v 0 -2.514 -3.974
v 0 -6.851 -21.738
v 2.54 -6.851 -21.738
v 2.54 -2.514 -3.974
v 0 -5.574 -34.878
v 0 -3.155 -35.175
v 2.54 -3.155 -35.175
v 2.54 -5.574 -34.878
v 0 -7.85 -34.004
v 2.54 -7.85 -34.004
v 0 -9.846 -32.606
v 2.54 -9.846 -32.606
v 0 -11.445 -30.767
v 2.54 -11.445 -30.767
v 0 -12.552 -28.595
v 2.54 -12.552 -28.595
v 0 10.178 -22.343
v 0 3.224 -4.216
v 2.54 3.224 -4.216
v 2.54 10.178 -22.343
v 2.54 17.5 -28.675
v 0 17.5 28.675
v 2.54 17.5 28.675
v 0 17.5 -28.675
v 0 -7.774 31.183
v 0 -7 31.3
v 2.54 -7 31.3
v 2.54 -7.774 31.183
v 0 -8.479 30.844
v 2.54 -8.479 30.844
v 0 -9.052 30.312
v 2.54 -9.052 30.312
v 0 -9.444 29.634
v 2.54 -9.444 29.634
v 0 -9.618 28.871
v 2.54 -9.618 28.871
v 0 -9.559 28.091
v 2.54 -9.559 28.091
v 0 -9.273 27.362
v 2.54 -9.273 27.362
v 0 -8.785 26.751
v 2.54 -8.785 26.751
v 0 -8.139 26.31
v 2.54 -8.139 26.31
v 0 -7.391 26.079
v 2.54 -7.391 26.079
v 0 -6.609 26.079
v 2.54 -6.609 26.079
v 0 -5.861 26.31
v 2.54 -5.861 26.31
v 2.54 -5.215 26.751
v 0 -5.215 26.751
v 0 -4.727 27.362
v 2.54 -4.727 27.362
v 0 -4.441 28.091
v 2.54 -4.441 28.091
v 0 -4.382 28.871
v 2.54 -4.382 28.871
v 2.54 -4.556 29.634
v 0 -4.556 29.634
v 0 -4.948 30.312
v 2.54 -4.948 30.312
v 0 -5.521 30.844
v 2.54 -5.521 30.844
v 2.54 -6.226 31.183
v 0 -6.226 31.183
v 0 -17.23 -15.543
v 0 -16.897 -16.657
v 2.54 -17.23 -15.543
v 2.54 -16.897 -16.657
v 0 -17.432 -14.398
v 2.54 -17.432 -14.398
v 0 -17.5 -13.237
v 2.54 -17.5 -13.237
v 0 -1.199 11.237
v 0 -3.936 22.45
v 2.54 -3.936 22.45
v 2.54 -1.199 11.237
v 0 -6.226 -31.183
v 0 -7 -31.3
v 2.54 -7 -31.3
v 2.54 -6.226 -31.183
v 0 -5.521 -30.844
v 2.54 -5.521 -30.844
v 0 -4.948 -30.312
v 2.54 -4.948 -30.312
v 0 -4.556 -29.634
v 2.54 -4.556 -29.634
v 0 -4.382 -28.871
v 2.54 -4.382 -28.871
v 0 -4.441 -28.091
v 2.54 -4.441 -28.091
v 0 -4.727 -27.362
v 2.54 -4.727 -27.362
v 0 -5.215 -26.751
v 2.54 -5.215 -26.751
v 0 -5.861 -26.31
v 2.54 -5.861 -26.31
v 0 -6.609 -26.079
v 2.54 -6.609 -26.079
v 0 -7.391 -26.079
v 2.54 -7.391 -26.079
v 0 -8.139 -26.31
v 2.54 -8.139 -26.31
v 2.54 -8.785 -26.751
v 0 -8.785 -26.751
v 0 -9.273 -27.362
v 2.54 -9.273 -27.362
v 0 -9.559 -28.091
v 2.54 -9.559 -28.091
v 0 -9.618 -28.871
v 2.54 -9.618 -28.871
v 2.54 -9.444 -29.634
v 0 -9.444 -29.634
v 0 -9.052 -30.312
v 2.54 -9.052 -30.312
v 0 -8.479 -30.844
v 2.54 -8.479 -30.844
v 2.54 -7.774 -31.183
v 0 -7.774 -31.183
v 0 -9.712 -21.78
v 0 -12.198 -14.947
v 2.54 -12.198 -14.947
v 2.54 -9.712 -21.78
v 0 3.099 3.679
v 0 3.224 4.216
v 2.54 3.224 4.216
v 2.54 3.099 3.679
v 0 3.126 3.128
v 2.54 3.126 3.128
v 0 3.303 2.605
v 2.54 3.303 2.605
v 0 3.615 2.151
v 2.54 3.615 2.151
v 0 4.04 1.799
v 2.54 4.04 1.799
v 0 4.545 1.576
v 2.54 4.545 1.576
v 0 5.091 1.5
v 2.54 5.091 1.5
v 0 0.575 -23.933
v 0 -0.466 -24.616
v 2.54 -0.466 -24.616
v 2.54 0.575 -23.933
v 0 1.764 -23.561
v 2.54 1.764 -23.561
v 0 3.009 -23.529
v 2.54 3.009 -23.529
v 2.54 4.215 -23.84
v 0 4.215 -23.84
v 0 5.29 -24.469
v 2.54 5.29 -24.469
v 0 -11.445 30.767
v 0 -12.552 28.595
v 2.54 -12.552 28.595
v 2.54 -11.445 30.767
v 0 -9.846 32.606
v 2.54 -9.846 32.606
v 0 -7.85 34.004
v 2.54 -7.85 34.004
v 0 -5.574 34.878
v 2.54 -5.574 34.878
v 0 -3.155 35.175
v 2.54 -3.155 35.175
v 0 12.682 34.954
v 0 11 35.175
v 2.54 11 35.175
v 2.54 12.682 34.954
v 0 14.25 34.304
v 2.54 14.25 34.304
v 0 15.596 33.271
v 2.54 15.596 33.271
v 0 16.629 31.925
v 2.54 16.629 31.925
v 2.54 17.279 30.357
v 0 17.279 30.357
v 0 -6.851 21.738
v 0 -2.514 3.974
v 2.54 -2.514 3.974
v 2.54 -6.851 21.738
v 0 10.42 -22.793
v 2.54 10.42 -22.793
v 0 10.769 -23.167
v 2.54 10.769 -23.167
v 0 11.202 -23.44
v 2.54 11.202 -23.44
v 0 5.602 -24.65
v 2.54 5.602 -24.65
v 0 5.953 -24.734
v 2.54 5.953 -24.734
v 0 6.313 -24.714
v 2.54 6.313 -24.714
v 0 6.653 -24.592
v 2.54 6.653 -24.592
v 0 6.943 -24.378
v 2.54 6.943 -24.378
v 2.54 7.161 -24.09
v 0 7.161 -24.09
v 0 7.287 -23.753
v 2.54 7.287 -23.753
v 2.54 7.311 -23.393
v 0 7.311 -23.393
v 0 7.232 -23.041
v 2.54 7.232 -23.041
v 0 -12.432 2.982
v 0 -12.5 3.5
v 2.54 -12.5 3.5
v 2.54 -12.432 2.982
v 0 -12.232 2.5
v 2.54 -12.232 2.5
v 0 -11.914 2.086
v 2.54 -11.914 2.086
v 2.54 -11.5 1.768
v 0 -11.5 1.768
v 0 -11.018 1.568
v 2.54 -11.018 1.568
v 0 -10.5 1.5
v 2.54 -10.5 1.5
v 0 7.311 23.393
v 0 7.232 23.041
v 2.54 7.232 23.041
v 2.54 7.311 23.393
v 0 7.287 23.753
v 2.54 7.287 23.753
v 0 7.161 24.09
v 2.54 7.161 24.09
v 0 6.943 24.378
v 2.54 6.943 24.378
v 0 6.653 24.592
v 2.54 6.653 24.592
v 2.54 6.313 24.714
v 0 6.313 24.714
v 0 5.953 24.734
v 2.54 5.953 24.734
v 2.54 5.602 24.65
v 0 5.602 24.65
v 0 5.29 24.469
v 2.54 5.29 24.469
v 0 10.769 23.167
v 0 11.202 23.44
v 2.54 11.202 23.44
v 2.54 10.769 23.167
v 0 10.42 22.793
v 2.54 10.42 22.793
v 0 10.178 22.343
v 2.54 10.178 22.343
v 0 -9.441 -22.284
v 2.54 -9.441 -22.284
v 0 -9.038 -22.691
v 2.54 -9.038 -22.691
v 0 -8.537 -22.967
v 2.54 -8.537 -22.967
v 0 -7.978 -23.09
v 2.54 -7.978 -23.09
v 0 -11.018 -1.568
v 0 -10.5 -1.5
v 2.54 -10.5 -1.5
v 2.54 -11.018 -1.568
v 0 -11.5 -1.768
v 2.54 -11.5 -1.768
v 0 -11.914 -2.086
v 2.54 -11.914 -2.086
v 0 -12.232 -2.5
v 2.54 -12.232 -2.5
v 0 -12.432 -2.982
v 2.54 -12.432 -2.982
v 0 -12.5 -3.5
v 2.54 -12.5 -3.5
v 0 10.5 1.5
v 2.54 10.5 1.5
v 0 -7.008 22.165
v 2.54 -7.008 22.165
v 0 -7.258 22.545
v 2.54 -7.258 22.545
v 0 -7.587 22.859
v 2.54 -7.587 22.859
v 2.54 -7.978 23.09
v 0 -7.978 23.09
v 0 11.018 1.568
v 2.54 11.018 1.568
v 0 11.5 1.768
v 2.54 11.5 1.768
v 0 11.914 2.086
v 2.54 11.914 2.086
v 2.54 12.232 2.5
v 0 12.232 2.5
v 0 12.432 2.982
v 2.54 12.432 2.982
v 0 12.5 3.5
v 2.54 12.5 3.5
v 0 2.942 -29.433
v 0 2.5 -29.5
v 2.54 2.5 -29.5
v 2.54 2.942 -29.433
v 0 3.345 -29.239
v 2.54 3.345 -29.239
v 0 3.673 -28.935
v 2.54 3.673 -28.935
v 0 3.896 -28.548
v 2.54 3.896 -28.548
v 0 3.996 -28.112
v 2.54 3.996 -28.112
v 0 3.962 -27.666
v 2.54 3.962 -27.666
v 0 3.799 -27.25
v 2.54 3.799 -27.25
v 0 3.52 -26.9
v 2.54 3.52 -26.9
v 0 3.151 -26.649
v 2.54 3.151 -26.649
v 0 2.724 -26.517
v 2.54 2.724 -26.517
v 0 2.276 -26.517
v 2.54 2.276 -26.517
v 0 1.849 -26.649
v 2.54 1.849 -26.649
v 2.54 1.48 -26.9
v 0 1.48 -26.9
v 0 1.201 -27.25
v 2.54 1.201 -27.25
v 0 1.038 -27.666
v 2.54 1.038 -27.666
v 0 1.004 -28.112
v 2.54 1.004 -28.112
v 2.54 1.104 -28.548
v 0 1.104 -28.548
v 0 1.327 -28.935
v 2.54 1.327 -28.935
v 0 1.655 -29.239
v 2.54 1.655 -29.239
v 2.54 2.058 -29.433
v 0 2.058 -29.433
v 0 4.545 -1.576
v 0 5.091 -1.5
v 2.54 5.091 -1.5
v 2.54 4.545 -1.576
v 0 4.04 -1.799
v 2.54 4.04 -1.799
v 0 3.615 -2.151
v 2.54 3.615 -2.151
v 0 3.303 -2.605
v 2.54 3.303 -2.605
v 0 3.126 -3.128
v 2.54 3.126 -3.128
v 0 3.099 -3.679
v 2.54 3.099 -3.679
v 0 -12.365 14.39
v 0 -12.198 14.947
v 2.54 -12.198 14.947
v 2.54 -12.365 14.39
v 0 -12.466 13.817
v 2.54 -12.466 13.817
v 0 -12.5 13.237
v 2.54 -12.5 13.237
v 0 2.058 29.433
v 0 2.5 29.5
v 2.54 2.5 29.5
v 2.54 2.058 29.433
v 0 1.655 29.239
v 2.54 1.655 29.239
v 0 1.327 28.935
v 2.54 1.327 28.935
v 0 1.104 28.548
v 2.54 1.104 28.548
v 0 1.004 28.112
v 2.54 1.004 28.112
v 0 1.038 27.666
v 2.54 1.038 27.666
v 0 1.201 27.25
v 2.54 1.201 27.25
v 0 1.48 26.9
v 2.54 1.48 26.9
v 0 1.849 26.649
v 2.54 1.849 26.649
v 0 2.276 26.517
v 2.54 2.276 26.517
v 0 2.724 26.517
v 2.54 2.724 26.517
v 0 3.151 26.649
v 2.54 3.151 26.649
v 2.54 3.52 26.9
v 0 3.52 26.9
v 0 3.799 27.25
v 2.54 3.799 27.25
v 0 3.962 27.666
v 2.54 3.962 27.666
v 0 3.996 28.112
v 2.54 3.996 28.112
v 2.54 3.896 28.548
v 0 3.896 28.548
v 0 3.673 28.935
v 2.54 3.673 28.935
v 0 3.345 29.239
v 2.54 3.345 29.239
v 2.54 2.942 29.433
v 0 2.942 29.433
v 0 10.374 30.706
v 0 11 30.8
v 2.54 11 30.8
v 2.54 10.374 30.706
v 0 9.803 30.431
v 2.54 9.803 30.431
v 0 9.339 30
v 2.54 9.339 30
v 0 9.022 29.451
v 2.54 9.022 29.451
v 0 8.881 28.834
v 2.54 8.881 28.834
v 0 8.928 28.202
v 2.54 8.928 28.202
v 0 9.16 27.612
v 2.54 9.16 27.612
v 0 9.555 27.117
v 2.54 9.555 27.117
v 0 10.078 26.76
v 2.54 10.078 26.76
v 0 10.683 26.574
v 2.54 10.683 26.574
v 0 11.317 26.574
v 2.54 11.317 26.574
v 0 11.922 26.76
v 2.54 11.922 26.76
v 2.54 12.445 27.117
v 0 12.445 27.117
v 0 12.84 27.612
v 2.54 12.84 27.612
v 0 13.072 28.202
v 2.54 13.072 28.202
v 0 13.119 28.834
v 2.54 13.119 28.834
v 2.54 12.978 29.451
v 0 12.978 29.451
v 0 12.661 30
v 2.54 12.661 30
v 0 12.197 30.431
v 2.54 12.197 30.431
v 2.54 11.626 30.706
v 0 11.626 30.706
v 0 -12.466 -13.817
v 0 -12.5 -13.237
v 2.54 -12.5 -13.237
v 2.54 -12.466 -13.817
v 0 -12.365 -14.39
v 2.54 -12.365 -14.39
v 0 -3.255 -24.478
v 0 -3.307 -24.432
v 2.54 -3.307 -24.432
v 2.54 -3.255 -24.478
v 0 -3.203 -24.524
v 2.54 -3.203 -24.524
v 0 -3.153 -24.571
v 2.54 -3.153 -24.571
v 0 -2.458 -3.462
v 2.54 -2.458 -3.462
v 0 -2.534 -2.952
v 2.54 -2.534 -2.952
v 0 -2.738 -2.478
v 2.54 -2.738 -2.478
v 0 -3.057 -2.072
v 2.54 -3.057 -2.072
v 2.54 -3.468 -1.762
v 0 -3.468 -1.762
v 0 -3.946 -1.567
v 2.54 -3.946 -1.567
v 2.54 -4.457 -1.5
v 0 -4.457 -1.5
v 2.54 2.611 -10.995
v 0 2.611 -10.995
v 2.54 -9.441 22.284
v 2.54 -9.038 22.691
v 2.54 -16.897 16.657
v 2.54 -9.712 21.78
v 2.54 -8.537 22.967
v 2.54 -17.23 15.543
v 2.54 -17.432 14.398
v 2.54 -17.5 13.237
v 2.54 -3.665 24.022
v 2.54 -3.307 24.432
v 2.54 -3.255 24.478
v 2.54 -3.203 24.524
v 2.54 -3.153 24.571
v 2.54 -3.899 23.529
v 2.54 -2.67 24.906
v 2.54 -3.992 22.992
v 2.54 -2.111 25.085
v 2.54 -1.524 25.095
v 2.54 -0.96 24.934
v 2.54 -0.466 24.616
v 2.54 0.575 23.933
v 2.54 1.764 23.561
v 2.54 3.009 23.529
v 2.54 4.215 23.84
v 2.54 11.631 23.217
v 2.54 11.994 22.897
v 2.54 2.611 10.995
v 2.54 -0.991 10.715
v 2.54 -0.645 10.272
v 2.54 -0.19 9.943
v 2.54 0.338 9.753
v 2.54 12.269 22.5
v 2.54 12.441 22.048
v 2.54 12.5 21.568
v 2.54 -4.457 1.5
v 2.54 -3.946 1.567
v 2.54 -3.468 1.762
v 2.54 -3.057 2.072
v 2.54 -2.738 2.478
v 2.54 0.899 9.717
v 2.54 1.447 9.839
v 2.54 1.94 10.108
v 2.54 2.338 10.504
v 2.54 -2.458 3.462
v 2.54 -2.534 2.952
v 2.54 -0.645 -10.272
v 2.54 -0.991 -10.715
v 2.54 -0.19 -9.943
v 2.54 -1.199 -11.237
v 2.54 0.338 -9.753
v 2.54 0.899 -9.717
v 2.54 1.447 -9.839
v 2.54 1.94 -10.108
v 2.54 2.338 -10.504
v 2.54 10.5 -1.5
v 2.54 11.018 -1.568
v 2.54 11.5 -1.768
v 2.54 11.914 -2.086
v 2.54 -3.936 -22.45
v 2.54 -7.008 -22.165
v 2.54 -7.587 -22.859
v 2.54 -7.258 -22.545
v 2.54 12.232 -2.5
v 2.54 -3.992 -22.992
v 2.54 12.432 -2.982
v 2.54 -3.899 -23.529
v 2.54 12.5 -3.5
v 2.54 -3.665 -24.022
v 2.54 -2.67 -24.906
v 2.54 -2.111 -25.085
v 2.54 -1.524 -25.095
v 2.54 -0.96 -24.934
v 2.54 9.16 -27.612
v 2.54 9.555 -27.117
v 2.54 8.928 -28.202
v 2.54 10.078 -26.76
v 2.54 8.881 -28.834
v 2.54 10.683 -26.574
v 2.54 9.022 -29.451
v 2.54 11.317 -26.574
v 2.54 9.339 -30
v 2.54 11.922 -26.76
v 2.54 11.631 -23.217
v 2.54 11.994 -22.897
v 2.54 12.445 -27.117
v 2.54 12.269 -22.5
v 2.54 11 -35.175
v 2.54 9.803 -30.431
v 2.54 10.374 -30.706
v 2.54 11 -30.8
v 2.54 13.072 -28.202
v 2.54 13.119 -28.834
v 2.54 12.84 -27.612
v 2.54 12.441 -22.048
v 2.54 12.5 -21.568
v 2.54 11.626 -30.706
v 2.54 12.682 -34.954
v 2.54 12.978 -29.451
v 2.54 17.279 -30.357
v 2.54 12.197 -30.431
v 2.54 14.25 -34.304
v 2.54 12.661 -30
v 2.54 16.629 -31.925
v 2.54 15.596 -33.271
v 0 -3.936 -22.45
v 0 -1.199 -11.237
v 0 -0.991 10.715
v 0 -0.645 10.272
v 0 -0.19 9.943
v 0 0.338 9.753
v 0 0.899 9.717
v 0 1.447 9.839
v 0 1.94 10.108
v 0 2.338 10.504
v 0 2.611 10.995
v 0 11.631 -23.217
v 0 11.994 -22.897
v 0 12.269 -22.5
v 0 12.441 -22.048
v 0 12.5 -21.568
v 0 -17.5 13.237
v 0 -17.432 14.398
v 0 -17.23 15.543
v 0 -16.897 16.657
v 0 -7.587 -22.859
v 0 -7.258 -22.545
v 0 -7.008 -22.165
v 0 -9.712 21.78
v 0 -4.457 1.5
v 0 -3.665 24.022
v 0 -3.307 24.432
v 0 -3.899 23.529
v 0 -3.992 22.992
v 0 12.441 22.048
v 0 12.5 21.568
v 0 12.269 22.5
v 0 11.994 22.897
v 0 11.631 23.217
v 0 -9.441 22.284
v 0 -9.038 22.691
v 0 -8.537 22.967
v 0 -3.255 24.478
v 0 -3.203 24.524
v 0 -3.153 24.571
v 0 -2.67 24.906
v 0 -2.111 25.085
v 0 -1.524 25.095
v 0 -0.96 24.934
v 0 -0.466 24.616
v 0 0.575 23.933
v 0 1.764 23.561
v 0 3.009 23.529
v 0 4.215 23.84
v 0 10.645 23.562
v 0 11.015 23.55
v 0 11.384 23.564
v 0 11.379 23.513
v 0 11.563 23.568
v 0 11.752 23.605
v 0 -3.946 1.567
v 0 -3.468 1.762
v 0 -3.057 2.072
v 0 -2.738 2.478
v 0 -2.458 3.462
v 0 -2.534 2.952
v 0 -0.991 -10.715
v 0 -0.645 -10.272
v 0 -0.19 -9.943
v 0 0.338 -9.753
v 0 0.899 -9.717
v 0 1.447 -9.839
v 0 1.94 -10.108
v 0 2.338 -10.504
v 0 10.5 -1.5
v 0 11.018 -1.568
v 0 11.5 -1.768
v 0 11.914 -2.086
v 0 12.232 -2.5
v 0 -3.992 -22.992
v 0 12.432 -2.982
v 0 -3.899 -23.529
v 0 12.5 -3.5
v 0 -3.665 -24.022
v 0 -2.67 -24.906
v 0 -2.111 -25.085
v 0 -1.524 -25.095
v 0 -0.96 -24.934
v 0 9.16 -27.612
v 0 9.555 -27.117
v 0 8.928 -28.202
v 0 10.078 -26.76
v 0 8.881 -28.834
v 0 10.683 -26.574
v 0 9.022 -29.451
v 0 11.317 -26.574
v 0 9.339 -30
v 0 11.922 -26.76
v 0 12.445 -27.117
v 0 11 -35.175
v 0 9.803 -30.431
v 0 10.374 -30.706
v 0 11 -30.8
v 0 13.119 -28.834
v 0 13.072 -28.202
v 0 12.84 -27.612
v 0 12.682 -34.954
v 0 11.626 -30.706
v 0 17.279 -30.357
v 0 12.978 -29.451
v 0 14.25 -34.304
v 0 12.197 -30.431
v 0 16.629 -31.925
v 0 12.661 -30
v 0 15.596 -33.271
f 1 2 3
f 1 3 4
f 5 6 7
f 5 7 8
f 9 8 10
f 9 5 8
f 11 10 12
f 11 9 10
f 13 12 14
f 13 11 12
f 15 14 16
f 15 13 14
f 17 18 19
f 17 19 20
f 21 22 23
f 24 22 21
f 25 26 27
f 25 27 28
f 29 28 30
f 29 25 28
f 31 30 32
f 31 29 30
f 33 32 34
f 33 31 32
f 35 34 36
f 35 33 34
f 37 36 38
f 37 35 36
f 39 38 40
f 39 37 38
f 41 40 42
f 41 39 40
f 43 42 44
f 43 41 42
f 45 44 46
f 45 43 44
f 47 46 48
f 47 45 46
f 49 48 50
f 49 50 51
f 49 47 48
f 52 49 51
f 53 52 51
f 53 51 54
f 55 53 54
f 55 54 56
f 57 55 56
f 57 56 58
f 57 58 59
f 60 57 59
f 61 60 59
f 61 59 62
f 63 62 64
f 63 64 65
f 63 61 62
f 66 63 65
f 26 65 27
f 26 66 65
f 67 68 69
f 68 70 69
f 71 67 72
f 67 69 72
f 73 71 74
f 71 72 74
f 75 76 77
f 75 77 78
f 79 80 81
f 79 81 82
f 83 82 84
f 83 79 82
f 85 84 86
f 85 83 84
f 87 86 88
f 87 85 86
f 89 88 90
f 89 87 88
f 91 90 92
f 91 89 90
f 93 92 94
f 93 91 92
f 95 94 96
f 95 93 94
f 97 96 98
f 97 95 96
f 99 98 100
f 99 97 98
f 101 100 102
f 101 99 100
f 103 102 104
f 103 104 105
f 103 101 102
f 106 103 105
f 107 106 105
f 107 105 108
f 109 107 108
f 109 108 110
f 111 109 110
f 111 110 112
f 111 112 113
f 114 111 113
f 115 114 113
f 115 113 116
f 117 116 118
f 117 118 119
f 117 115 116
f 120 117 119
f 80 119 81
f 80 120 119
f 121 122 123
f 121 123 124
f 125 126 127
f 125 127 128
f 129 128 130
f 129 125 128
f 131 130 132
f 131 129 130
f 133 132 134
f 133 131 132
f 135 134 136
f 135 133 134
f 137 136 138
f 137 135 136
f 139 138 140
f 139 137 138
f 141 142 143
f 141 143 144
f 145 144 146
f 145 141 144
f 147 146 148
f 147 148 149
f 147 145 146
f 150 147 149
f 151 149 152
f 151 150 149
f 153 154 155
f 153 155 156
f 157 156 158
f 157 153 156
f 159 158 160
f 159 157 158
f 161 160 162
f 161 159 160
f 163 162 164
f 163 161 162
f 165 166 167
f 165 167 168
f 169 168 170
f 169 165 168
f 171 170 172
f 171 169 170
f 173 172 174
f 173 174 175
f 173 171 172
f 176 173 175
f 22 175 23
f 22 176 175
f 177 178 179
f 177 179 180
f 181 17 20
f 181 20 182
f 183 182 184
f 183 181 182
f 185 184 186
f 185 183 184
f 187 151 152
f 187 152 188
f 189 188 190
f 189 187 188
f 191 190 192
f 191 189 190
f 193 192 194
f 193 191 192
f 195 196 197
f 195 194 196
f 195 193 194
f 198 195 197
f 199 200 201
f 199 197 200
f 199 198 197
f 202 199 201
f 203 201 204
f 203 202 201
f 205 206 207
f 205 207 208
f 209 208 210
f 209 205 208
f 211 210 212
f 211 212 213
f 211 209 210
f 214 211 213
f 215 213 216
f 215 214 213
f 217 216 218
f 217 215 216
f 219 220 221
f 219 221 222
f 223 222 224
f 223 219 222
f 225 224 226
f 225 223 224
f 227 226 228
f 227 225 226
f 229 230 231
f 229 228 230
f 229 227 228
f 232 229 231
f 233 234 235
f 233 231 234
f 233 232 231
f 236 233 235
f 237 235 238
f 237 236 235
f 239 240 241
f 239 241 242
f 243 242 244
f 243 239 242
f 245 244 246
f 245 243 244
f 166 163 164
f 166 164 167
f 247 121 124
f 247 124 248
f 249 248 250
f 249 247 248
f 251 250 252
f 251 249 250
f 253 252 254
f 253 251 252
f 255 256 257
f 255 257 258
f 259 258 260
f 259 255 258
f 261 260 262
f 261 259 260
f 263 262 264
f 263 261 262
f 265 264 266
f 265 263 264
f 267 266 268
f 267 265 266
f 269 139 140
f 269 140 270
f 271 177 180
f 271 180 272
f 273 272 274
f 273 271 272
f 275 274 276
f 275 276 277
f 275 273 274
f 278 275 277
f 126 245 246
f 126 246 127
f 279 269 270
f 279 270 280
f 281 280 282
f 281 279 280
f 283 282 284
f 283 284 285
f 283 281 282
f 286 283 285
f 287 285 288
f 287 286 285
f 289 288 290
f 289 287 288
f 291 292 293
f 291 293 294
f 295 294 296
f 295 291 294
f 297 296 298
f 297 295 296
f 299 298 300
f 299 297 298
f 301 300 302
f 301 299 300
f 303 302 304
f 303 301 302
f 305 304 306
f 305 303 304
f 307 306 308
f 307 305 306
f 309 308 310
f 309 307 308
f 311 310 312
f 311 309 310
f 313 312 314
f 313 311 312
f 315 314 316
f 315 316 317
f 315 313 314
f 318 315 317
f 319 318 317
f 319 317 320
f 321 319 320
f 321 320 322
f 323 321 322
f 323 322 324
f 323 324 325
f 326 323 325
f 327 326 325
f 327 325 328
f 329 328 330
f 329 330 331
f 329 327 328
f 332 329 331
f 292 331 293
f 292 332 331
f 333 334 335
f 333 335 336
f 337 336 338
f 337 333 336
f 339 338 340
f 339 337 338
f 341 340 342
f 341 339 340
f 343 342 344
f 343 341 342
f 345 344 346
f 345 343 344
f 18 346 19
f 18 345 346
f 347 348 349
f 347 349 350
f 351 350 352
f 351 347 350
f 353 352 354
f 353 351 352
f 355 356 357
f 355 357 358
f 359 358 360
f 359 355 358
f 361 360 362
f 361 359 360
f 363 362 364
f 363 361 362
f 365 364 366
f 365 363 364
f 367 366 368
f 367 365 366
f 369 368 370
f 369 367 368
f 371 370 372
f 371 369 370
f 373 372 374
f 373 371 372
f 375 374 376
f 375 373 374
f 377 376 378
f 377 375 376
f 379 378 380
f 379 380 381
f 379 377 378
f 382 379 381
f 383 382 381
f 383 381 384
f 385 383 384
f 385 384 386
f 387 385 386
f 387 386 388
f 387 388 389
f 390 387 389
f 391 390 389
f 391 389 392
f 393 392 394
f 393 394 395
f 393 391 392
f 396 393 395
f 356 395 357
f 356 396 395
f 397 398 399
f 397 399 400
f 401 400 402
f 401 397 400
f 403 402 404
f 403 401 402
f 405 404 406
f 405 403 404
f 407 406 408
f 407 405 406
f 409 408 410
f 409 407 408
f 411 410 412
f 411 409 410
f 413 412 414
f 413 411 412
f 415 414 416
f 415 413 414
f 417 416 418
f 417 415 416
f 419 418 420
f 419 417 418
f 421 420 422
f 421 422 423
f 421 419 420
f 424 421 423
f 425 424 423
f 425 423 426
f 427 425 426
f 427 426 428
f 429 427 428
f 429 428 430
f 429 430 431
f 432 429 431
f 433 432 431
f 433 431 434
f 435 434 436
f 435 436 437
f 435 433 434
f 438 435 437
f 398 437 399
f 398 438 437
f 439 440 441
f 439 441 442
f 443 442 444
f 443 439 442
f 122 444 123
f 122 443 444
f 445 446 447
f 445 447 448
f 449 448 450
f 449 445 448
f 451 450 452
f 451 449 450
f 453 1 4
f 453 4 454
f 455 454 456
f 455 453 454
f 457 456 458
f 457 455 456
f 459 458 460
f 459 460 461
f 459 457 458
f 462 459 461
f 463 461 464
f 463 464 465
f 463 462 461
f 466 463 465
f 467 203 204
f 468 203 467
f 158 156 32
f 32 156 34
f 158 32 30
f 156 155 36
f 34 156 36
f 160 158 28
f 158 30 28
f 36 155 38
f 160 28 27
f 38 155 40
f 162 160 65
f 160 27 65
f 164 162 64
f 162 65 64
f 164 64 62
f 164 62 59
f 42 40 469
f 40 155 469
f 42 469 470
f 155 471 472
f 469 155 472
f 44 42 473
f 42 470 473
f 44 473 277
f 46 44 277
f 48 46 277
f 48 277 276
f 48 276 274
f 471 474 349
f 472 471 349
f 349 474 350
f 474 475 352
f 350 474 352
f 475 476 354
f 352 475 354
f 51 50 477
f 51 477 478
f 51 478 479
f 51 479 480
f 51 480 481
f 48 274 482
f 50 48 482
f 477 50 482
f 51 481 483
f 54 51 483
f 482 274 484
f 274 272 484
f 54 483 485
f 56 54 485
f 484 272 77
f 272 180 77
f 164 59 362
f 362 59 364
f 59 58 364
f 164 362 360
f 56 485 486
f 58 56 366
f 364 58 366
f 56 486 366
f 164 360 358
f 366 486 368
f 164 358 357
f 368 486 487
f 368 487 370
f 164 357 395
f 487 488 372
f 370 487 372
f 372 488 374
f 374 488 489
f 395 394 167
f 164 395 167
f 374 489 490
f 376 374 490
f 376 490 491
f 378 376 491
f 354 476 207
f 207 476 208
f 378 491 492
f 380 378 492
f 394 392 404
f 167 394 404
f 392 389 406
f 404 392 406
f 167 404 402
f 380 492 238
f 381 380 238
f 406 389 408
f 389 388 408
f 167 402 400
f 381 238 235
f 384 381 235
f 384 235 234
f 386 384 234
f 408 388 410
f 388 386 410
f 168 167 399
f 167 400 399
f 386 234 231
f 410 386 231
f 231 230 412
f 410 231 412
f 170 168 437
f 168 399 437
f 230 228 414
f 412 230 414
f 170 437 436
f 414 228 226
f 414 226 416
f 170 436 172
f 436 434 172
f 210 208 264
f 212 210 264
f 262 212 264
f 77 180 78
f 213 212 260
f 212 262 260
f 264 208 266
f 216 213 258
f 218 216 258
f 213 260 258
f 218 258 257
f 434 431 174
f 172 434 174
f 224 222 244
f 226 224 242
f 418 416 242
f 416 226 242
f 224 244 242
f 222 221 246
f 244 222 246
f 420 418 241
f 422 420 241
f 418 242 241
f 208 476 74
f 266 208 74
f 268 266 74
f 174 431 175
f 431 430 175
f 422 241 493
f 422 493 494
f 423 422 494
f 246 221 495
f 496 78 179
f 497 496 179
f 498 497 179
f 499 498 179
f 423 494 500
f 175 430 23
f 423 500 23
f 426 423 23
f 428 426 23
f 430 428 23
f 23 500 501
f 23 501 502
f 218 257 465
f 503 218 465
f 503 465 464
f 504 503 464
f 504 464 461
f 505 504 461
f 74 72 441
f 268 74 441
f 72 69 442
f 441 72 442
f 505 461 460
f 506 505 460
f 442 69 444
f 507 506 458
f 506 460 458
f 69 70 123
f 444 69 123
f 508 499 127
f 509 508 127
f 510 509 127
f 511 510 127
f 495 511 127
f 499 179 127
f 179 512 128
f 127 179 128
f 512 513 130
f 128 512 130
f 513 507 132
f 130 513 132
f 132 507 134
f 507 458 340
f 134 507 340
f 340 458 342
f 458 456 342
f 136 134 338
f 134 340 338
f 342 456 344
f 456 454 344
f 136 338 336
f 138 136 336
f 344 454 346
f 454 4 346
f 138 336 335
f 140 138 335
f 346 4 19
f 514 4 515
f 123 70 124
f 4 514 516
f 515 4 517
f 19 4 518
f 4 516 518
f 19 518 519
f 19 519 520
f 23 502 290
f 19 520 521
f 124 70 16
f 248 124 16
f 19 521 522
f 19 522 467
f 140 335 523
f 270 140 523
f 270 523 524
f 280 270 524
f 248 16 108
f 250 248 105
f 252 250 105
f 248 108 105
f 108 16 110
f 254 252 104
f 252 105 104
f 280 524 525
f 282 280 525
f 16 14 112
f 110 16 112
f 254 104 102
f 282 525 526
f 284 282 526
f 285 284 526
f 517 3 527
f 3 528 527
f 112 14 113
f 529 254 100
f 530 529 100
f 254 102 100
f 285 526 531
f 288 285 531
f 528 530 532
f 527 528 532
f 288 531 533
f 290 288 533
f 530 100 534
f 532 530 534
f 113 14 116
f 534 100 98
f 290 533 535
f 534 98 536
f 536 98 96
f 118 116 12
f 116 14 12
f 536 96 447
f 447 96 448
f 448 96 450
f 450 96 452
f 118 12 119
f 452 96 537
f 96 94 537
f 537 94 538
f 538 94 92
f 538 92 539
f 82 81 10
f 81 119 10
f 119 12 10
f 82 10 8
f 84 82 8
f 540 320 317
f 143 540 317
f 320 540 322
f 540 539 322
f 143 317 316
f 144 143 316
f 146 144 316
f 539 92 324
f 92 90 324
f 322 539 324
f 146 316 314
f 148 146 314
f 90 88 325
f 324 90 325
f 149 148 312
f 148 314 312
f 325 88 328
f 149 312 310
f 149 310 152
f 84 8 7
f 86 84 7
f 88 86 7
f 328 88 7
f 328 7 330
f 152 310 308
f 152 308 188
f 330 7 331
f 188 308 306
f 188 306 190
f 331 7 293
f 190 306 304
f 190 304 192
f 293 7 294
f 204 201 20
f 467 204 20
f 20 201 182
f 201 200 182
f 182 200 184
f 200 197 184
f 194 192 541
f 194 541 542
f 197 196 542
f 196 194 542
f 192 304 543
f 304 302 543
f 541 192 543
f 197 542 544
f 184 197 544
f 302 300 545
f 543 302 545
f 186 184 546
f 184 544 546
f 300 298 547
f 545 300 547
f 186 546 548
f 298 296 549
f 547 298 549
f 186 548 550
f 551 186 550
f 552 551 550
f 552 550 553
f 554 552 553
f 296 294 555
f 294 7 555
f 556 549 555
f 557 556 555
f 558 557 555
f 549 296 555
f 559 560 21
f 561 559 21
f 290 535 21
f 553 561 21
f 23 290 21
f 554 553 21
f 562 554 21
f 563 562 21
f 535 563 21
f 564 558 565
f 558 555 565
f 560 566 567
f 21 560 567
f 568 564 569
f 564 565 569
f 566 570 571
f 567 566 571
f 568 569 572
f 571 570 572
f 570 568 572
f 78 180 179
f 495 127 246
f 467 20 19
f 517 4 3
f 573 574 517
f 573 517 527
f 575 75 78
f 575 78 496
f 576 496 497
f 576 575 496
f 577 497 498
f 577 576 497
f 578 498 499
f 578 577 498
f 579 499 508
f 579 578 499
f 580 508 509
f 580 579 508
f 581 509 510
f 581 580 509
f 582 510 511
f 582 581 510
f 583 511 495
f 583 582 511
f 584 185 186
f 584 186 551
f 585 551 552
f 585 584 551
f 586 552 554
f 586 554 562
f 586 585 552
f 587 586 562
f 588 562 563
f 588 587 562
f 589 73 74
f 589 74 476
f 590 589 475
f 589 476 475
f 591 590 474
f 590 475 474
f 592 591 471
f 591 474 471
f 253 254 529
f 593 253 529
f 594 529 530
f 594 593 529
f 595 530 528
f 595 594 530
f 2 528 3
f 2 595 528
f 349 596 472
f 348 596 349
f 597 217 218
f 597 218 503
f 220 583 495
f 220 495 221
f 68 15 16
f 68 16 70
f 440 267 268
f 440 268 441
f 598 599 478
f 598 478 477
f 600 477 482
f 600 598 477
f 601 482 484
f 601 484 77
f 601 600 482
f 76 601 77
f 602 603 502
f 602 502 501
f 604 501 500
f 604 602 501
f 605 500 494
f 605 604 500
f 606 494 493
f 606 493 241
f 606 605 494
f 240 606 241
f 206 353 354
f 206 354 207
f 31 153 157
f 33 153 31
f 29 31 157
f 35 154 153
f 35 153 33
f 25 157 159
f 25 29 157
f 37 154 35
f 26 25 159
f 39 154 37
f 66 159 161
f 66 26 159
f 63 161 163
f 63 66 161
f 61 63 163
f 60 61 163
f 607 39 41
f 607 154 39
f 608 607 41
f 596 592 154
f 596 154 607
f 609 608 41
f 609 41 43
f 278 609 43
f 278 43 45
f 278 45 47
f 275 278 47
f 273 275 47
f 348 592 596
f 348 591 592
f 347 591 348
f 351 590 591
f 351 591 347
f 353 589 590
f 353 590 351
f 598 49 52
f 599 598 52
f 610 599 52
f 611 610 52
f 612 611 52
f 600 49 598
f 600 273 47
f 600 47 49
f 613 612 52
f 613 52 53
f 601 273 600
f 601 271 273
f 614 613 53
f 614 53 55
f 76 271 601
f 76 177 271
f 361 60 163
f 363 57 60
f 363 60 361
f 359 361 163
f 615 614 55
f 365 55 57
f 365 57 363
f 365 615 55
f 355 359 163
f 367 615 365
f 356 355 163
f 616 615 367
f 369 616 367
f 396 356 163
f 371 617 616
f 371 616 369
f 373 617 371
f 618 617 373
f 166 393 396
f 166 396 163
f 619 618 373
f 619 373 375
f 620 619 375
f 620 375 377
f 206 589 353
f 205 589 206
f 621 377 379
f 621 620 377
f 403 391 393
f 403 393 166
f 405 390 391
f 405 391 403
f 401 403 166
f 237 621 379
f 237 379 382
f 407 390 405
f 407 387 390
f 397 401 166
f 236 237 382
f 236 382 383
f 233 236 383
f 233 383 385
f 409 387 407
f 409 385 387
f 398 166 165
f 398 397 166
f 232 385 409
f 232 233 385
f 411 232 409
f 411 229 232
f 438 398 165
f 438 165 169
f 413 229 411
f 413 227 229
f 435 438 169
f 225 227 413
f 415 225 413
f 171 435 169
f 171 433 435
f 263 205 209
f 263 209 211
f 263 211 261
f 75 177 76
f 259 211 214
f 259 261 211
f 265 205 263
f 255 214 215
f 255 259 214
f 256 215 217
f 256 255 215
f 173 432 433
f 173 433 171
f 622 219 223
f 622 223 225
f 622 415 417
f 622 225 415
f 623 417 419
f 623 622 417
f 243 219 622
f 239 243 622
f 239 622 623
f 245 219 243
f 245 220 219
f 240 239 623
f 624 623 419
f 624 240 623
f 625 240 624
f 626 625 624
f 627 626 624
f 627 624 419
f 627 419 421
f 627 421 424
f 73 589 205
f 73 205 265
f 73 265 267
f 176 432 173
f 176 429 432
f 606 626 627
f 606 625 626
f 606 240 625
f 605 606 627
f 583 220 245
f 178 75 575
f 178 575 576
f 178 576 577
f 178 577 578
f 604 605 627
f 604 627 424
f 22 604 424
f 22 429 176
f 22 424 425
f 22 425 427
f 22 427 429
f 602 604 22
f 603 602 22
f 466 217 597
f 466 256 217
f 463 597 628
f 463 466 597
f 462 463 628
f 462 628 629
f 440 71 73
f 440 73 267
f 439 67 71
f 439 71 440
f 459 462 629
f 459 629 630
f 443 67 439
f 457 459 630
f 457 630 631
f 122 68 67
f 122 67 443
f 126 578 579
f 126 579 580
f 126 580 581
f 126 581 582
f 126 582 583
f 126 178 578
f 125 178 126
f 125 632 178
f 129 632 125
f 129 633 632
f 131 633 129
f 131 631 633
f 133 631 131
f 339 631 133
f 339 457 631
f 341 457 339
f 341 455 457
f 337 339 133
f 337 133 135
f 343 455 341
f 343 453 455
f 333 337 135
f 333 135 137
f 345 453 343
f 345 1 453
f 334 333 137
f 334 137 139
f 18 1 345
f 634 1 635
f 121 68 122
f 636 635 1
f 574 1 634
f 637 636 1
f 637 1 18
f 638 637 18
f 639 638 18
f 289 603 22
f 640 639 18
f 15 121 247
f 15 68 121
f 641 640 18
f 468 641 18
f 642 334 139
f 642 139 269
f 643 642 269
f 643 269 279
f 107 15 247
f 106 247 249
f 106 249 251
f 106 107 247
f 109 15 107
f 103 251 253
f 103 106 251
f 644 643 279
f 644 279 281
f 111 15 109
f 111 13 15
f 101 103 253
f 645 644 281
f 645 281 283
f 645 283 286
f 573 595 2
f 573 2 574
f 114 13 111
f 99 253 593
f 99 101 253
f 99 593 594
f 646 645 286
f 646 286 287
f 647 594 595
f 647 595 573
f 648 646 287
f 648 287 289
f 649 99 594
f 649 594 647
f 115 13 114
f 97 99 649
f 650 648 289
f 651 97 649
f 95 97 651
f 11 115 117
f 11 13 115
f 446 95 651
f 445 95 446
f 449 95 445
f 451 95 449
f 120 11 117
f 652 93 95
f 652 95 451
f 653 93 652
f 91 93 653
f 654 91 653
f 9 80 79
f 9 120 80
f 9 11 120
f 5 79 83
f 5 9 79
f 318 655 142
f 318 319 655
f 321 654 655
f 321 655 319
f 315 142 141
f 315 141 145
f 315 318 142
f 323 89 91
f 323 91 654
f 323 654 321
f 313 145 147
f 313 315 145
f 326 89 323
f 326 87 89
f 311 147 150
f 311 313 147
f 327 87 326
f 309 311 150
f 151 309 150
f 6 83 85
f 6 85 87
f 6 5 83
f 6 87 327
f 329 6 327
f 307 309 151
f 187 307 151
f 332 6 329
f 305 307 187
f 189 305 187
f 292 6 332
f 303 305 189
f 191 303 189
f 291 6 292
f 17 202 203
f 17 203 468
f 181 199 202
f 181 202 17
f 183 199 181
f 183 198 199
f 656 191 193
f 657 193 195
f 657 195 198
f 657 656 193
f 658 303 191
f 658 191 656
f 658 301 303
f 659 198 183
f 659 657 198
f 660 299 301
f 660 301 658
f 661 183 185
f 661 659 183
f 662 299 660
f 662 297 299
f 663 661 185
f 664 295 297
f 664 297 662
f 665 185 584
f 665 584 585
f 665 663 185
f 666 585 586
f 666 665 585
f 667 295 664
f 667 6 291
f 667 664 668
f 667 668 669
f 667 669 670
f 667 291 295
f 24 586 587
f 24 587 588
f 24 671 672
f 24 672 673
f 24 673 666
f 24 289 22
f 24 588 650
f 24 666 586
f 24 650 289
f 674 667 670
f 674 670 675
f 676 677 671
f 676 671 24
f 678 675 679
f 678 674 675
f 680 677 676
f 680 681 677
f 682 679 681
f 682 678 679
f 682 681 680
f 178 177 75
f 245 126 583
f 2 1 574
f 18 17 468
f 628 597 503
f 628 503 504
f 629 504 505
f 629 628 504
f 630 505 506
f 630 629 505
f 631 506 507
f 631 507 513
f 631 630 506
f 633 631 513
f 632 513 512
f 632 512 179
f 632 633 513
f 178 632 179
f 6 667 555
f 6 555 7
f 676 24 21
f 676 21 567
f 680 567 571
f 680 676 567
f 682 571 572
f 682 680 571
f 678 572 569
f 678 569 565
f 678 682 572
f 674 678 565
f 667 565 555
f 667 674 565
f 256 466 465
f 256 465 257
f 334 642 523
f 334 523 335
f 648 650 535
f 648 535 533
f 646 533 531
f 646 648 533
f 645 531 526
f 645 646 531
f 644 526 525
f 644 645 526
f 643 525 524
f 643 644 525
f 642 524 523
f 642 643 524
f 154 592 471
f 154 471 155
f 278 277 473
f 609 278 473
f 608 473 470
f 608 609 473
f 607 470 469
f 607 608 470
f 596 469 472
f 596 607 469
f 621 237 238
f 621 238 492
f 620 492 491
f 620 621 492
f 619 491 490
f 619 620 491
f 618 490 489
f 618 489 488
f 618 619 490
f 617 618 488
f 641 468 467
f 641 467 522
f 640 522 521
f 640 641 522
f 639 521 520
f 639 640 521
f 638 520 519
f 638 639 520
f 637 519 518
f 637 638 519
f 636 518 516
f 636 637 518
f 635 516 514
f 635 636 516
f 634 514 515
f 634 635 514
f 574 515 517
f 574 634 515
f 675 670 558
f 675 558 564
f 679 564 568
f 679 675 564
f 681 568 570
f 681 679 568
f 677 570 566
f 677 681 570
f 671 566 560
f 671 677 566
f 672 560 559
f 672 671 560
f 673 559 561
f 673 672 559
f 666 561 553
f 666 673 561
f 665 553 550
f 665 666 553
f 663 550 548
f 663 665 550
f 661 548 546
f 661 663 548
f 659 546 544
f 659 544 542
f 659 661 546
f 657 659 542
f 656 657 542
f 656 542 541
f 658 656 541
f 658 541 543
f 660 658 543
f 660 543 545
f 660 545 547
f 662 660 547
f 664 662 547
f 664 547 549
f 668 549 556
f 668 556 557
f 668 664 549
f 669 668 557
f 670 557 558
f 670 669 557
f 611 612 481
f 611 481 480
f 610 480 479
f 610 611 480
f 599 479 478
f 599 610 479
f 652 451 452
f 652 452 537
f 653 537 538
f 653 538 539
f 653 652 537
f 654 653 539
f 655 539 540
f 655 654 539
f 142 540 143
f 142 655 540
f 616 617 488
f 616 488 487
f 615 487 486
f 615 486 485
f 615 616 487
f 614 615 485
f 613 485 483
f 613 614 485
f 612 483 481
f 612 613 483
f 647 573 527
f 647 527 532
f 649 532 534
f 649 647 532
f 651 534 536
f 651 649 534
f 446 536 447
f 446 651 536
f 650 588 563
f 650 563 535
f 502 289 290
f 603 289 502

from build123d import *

# Parameters (mm, degrees)
SKETCH1_R           = 2.125
SKETCH1_R_2         = 1.5
SKETCH1_R_3         = 2.625
BOSS_EXTRUDE1_DEPTH = 2.54
FILLET1_R           = 10
CUT_EXTRUDE2_DEPTH  = 40.369813627
FILLET2_R           = 2


with BuildPart() as part:
    # Sketch1 → Boss-Extrude1 (new body)
    with BuildSketch(Plane(origin=(0, 0, 0), x_dir=(0, 0, -1), z_dir=(1, 0, 0))):
        with BuildLine():
            Line((15, 17.5), (28.675, 17.5))
            ThreePointArc((28.675, 17.5), (33.271194078, 15.596194078), (35.175, 11))
            Line((35.175, 11), (35.175, -3.154825142))
            ThreePointArc((35.175, -3.154825142), (33.366520443, -8.890589505), (28.595201433, -12.551751349))
            Line((28.595201433, -12.551751349), (15, -17.5))
            Line((15, -17.5), (-15, -17.5))
            Line((-15, -17.5), (-28.595201433, -12.551751349))
            ThreePointArc((-28.595201433, -12.551751349), (-33.366520443, -8.890589505), (-35.175, -3.154825142))
            Line((-35.175, -3.154825142), (-35.175, 11))
            ThreePointArc((-35.175, 11), (-33.271194078, 15.596194078), (-28.675, 17.5))
            Line((-28.675, 17.5), (-15, 17.5))
            Line((-15, 17.5), (15, 17.5))
        make_face()
        with Locations((28.675, 11)):
            Circle(SKETCH1_R, mode=Mode.SUBTRACT)
        with Locations(Location((-28.675, 11, 0), (0, 0, 180))):
            Circle(SKETCH1_R, mode=Mode.SUBTRACT)
        with Locations((28, 2.5)):
            Circle(SKETCH1_R_2, mode=Mode.SUBTRACT)
        with Locations(Location((-28, 2.5, 0), (0, 0, 180))):
            Circle(SKETCH1_R_2, mode=Mode.SUBTRACT)
        with Locations((28.675, -7)):
            Circle(SKETCH1_R_3, mode=Mode.SUBTRACT)
        with Locations(Location((-28.675, -7, 0), (0, 0, 180))):
            Circle(SKETCH1_R_3, mode=Mode.SUBTRACT)
    extrude(amount=BOSS_EXTRUDE1_DEPTH)

    # Fillet1
    fillet1_edges = [part.edges().sort_by_distance(p)[0] for p in [
        (1.27, -17.5, -15),
        (1.27, -17.5, 15),
    ]]
    fillet(fillet1_edges, radius=FILLET1_R)

    # Sketch2 → Cut-Extrude2 (cut, through all)
    with BuildSketch(Plane(origin=(0, 0, 0), x_dir=(0, 0, -1), z_dir=(1, 0, 0))):
        with BuildLine():
            ThreePointArc((-23.774426054, 12.5), (-23.583197925, 11.582388729), (-23.562289313, 10.645296699))
            Line((-23.562289313, 10.645296699), (-1.5, 2.181994783))
            Line((-1.5, 2.181994783), (-1.5, 12.5))
            Line((-1.5, 12.5), (-23.774426054, 12.5))
        make_face()
        with BuildLine():
            ThreePointArc((-23.040869369, 7.232113781), (-24.495524174, 6.805676348), (-24.469315886, 5.29003041))
            ThreePointArc((-24.469315886, 5.29003041), (-23.690537785, 1.204416959), (-26.593153981, -1.774433796))
            ThreePointArc((-26.593153981, -1.774433796), (-24.964789293, -2.77212092), (-23.764069674, -4.257120431))
            Line((-23.764069674, -4.257120431), (-5.019125542, 0.318803158))
            Line((-5.019125542, 0.318803158), (-23.040869369, 7.232113781))
        make_face()
        with BuildLine():
            Line((23.774426054, 12.5), (1.5, 12.5))
            Line((1.5, 12.5), (1.5, 2.181994783))
            Line((1.5, 2.181994783), (23.562289313, 10.645296699))
            ThreePointArc((23.562289313, 10.645296699), (23.583197925, 11.582388729), (23.774426054, 12.5))
        make_face()
        with BuildLine():
            Line((-1.5, -12.5), (-1.5, -1.91022003))
            Line((-1.5, -1.91022003), (-23.052616211, -7.171538721))
            ThreePointArc((-23.052616211, -7.171538721), (-23.169671761, -8.15411697), (-23.457097153, -9.100979506))
            Line((-23.457097153, -9.100979506), (-14.94683091, -12.198463104))
            ThreePointArc((-14.94683091, -12.198463104), (-14.104971081, -12.424038765), (-13.236730193, -12.5))
            Line((-13.236730193, -12.5), (-1.5, -12.5))
        make_face()
        with BuildLine():
            Line((23.052616211, -7.171538721), (1.5, -1.91022003))
            Line((1.5, -1.91022003), (1.5, -12.5))
            Line((1.5, -12.5), (13.236730193, -12.5))
            ThreePointArc((13.236730193, -12.5), (14.104971081, -12.424038765), (14.94683091, -12.198463104))
            Line((14.94683091, -12.198463104), (23.457097153, -9.100979506))
            ThreePointArc((23.457097153, -9.100979506), (23.169671761, -8.15411697), (23.052616211, -7.171538721))
        make_face()
        with BuildLine():
            Line((23.040869369, 7.232113781), (5.019125542, 0.318803158))
            Line((5.019125542, 0.318803158), (23.764069674, -4.257120431))
            ThreePointArc((23.764069674, -4.257120431), (24.964789293, -2.77212092), (26.593153981, -1.774433796))
            ThreePointArc((26.593153981, -1.774433796), (23.690537785, 1.204416959), (24.469315886, 5.29003041))
            ThreePointArc((24.469315886, 5.29003041), (24.495524174, 6.805676348), (23.040869369, 7.232113781))
        make_face()
    extrude(amount=CUT_EXTRUDE2_DEPTH, mode=Mode.SUBTRACT)

    # Fillet2
    # the kernel refuses this fillet: 2 mm, written as the material it adds along each edge
    with BuildSketch(Plane(origin=(0, -12.5, -1.5), x_dir=(0, 0, -1), z_dir=(1, 0, 0)), Plane(origin=(0, 12.5, -1.5), x_dir=(0, -1, 0), z_dir=(1, 0, 0))) as fillet2_piece_1:
        with BuildLine():
            CenterArc((FILLET2_R, FILLET2_R), FILLET2_R, 180, 90)
            Line((0, FILLET2_R), (0, 0))
            Line((0, 0), (FILLET2_R, 0))
        make_face()
    extrude(amount=2.54)
    with BuildSketch(Plane(origin=(0, -12.5, 1.5), x_dir=(0, 0, 1), z_dir=(1, 0, 0)), Plane(origin=(0, 12.5, 1.5), x_dir=(0, -1, 0), z_dir=(1, 0, 0))) as fillet2_piece_2:
        with BuildLine():
            CenterArc((FILLET2_R, -FILLET2_R), FILLET2_R, 90, 90)
            Line((0, -FILLET2_R), (0, 0))
            Line((0, 0), (FILLET2_R, 0))
        make_face()
    extrude(amount=2.54)
    with BuildSketch(Plane(origin=(0, -1.91022003, -1.5), x_dir=(0, -1, 0), z_dir=(1, 0, 0)), Plane(origin=(0, -1.91022003, 1.5), x_dir=(0, -0.23715115410902912, 0.9714727634394881), z_dir=(1, 0, 0))) as fillet2_piece_3:
        with BuildLine():
            CenterArc((FILLET2_R * 1.27348001989, FILLET2_R), FILLET2_R, 166.281540054, 103.718459946)
            Line((FILLET2_R * 0.302007256452, FILLET2_R * 1.23715115411), (0, 0))
            Line((0, 0), (FILLET2_R * 1.27348001989, 0))
        make_face()
    extrude(amount=2.54)
    with BuildSketch(Plane(origin=(0, -9.100979506, -23.457097153), x_dir=(0, 0.9698771558526914, 0.24359454541326273), z_dir=(1, 0, 0))) as fillet2_piece_4:
        with BuildLine():
            CenterArc((1.805861593, 1.981337572), FILLET2_R, 185.90120906, 76.265486652)
            Line((-0.183539703, 1.775710517), (0, 0))
            ThreePointArc((0, 0), (0.766639355, 0.05248808), (1.533278711, 0))
        make_face()
    extrude(amount=2.54)
    with BuildSketch(Plane(origin=(0, -7.171538721, -23.052616211), x_dir=(0, -0.991038367867246, -0.13357751837425885), z_dir=(1, 0, 0)), Plane(origin=(0, -4.257120431, 23.764069674), x_dir=(0, 0.8180162943485203, 0.5751950470756115), z_dir=(1, 0, 0))) as fillet2_piece_5:
        with BuildLine():
            CenterArc((1.368631059, -1.989301963), FILLET2_R, 95.928822705, 62.676344636)
            Line((-0.493546379, -1.259716335), (0, 0))
            ThreePointArc((0, 0), (0.581022619, -0.03008823), (1.162045239, 0))
        make_face()
    extrude(amount=2.54)
    with BuildSketch(Plane(origin=(0, 2.181994783, -1.5), x_dir=(0, 0.3581607437996355, -0.9336599389504147), z_dir=(1, 0, 0)), Plane(origin=(0, 2.181994783, 1.5), x_dir=(0, 1, 0), z_dir=(1, 0, 0))) as fillet2_piece_6:
        with BuildLine():
            CenterArc((FILLET2_R * 1.45466318853, FILLET2_R), FILLET2_R, 159.012716108, 110.987283892)
            Line((FILLET2_R * 0.521003249583, FILLET2_R * 1.3581607438), (0, 0))
            Line((0, 0), (FILLET2_R * 1.45466318853, 0))
        make_face()
    extrude(amount=2.54)
    with BuildSketch(Plane(origin=(0, 10.645296699, -23.562289313), x_dir=(0, -0.3581607437996529, 0.9336599389504079), z_dir=(1, 0, 0))) as fillet2_piece_7:
        with BuildLine():
            CenterArc((1.305521848, -2), FILLET2_R, 90, 60.578668933)
            ThreePointArc((-0.436540129, -1.01754386), (-0.190709987, -0.520595577), (0, 0))
            Line((0, 0), (1.305521848, 0))
        make_face()
    extrude(amount=2.54)
    with BuildSketch(Plane(origin=(0, 12.5, -23.774426054), x_dir=(0, 0, 1), z_dir=(1, 0, 0))) as fillet2_piece_8:
        with BuildLine():
            CenterArc((2.206860542, 2), FILLET2_R, 184.024063889, 85.975936111)
            ThreePointArc((0.211791212, 1.859649123), (0.191509232, 0.92007422), (0, 0))
            Line((0, 0), (2.206860542, 0))
        make_face()
    extrude(amount=2.54)
    with BuildSketch(Plane(origin=(0, -7.171538721, 23.052616211), x_dir=(0, -0.9910383678672416, 0.13357751837428994), z_dir=(1, 0, 0))) as fillet2_piece_9:
        with BuildLine():
            CenterArc((1.368631059, 1.989301963), FILLET2_R, 201.394832659, 62.676344636)
            Line((-0.493546379, 1.259716335), (0, 0))
            ThreePointArc((0, 0), (0.581022619, 0.03008823), (1.162045239, 0))
        make_face()
    extrude(amount=2.54)
    with BuildSketch(Plane(origin=(0, -9.100979506, 23.457097153), x_dir=(0, -0.342020143325639, -0.9396926207859192), z_dir=(1, 0, 0))) as fillet2_piece_10:
        with BuildLine():
            CenterArc((1.785170766, 2), FILLET2_R, 193.734513348, 76.265486652)
            ThreePointArc((-0.157641792, 1.525153327), (-0.026610969, 0.767973148), (0, 0))
            Line((0, 0), (1.785170766, 0))
        make_face()
    extrude(amount=2.54)
    with BuildSketch(Plane(origin=(0, 0.318803158, -5.019125542), x_dir=(0, -0.23715115410902946, -0.971472763439488), z_dir=(1, 0, 0)), Plane(origin=(0, 0.318803158, 5.019125542), x_dir=(0, 0.3581607437996354, 0.9336599389504147), z_dir=(1, 0, 0))) as fillet2_piece_11:
        with BuildLine():
            CenterArc((FILLET2_R * 3.20022614882, FILLET2_R), FILLET2_R, 124.705743839, 145.294256161)
            Line((FILLET2_R * 2.63086420922, FILLET2_R * 1.82208696726), (0, 0))
            Line((0, 0), (FILLET2_R * 3.20022614882, 0))
        make_face()
    extrude(amount=2.54)
    with BuildSketch(Plane(origin=(0, -4.257120431, -23.764069674), x_dir=(0, 0.23715115410907214, 0.9714727634394775), z_dir=(1, 0, 0))) as fillet2_piece_12:
        with BuildLine():
            CenterArc((1.352949842, -2), FILLET2_R, 90, 62.676344636)
            ThreePointArc((-0.423905752, -1.081967213), (-0.183938065, -0.551959577), (0, 0))
            Line((0, 0), (1.352949842, 0))
        make_face()
    extrude(amount=2.54)
    with BuildSketch(Plane(origin=(0, -1.774433796, -26.593153981), x_dir=(0, 0.5517747839578403, 0.8339931581183857), z_dir=(1, 0, 0))) as fillet2_piece_13:
        with BuildLine():
            CenterArc((2.89721625, 1.929382533), FILLET2_R, 170.336114641, 84.3929753)
            ThreePointArc((0.925597299, 2.265118609), (0.587459761, 1.081618931), (0, 0))
            ThreePointArc((0, 0), (1.18522483, 0.158889301), (2.370449659, 0))
        make_face()
    extrude(amount=2.54)
    with BuildSketch(Plane(origin=(0, -1.774433796, 26.593153981), x_dir=(0, -0.5633055097989954, -0.826248692967253), z_dir=(1, 0, 0))) as fillet2_piece_14:
        with BuildLine():
            CenterArc((2.881946095, 1.95211825), FILLET2_R, 173.04447146, 84.3929753)
            ThreePointArc((0.896665206, 2.194316088), (0.595415815, 1.037055309), (0, 0))
            ThreePointArc((0, 0), (1.223467682, 0.134667421), (2.446935364, 0))
        make_face()
    extrude(amount=2.54)
    with BuildSketch(Plane(origin=(0, 12.5, 23.774426054), x_dir=(0, -0.9935772054285649, -0.11315624972913957), z_dir=(1, 0, 0))) as fillet2_piece_15:
        with BuildLine():
            CenterArc((2.236874473, 1.966373831), FILLET2_R, 173.502708243, 85.975936111)
            Line((0.249720063, 2.19268633), (0, 0))
            ThreePointArc((0, 0), (0.935835239, 0.086167059), (1.871670478, 0))
        make_face()
    extrude(amount=2.54)
    with BuildSketch(Plane(origin=(0, 10.645296699, 23.562289313), x_dir=(0, -0.35816074379962426, -0.9336599389504189), z_dir=(1, 0, 0))) as fillet2_piece_16:
        with BuildLine():
            CenterArc((1.305521848, 2), FILLET2_R, 209.421331067, 60.578668933)
            ThreePointArc((-0.436540129, 1.01754386), (-0.190709987, 0.520595577), (0, 0))
            Line((0, 0), (1.305521848, 0))
        make_face()
    extrude(amount=2.54)


solid = part.part
